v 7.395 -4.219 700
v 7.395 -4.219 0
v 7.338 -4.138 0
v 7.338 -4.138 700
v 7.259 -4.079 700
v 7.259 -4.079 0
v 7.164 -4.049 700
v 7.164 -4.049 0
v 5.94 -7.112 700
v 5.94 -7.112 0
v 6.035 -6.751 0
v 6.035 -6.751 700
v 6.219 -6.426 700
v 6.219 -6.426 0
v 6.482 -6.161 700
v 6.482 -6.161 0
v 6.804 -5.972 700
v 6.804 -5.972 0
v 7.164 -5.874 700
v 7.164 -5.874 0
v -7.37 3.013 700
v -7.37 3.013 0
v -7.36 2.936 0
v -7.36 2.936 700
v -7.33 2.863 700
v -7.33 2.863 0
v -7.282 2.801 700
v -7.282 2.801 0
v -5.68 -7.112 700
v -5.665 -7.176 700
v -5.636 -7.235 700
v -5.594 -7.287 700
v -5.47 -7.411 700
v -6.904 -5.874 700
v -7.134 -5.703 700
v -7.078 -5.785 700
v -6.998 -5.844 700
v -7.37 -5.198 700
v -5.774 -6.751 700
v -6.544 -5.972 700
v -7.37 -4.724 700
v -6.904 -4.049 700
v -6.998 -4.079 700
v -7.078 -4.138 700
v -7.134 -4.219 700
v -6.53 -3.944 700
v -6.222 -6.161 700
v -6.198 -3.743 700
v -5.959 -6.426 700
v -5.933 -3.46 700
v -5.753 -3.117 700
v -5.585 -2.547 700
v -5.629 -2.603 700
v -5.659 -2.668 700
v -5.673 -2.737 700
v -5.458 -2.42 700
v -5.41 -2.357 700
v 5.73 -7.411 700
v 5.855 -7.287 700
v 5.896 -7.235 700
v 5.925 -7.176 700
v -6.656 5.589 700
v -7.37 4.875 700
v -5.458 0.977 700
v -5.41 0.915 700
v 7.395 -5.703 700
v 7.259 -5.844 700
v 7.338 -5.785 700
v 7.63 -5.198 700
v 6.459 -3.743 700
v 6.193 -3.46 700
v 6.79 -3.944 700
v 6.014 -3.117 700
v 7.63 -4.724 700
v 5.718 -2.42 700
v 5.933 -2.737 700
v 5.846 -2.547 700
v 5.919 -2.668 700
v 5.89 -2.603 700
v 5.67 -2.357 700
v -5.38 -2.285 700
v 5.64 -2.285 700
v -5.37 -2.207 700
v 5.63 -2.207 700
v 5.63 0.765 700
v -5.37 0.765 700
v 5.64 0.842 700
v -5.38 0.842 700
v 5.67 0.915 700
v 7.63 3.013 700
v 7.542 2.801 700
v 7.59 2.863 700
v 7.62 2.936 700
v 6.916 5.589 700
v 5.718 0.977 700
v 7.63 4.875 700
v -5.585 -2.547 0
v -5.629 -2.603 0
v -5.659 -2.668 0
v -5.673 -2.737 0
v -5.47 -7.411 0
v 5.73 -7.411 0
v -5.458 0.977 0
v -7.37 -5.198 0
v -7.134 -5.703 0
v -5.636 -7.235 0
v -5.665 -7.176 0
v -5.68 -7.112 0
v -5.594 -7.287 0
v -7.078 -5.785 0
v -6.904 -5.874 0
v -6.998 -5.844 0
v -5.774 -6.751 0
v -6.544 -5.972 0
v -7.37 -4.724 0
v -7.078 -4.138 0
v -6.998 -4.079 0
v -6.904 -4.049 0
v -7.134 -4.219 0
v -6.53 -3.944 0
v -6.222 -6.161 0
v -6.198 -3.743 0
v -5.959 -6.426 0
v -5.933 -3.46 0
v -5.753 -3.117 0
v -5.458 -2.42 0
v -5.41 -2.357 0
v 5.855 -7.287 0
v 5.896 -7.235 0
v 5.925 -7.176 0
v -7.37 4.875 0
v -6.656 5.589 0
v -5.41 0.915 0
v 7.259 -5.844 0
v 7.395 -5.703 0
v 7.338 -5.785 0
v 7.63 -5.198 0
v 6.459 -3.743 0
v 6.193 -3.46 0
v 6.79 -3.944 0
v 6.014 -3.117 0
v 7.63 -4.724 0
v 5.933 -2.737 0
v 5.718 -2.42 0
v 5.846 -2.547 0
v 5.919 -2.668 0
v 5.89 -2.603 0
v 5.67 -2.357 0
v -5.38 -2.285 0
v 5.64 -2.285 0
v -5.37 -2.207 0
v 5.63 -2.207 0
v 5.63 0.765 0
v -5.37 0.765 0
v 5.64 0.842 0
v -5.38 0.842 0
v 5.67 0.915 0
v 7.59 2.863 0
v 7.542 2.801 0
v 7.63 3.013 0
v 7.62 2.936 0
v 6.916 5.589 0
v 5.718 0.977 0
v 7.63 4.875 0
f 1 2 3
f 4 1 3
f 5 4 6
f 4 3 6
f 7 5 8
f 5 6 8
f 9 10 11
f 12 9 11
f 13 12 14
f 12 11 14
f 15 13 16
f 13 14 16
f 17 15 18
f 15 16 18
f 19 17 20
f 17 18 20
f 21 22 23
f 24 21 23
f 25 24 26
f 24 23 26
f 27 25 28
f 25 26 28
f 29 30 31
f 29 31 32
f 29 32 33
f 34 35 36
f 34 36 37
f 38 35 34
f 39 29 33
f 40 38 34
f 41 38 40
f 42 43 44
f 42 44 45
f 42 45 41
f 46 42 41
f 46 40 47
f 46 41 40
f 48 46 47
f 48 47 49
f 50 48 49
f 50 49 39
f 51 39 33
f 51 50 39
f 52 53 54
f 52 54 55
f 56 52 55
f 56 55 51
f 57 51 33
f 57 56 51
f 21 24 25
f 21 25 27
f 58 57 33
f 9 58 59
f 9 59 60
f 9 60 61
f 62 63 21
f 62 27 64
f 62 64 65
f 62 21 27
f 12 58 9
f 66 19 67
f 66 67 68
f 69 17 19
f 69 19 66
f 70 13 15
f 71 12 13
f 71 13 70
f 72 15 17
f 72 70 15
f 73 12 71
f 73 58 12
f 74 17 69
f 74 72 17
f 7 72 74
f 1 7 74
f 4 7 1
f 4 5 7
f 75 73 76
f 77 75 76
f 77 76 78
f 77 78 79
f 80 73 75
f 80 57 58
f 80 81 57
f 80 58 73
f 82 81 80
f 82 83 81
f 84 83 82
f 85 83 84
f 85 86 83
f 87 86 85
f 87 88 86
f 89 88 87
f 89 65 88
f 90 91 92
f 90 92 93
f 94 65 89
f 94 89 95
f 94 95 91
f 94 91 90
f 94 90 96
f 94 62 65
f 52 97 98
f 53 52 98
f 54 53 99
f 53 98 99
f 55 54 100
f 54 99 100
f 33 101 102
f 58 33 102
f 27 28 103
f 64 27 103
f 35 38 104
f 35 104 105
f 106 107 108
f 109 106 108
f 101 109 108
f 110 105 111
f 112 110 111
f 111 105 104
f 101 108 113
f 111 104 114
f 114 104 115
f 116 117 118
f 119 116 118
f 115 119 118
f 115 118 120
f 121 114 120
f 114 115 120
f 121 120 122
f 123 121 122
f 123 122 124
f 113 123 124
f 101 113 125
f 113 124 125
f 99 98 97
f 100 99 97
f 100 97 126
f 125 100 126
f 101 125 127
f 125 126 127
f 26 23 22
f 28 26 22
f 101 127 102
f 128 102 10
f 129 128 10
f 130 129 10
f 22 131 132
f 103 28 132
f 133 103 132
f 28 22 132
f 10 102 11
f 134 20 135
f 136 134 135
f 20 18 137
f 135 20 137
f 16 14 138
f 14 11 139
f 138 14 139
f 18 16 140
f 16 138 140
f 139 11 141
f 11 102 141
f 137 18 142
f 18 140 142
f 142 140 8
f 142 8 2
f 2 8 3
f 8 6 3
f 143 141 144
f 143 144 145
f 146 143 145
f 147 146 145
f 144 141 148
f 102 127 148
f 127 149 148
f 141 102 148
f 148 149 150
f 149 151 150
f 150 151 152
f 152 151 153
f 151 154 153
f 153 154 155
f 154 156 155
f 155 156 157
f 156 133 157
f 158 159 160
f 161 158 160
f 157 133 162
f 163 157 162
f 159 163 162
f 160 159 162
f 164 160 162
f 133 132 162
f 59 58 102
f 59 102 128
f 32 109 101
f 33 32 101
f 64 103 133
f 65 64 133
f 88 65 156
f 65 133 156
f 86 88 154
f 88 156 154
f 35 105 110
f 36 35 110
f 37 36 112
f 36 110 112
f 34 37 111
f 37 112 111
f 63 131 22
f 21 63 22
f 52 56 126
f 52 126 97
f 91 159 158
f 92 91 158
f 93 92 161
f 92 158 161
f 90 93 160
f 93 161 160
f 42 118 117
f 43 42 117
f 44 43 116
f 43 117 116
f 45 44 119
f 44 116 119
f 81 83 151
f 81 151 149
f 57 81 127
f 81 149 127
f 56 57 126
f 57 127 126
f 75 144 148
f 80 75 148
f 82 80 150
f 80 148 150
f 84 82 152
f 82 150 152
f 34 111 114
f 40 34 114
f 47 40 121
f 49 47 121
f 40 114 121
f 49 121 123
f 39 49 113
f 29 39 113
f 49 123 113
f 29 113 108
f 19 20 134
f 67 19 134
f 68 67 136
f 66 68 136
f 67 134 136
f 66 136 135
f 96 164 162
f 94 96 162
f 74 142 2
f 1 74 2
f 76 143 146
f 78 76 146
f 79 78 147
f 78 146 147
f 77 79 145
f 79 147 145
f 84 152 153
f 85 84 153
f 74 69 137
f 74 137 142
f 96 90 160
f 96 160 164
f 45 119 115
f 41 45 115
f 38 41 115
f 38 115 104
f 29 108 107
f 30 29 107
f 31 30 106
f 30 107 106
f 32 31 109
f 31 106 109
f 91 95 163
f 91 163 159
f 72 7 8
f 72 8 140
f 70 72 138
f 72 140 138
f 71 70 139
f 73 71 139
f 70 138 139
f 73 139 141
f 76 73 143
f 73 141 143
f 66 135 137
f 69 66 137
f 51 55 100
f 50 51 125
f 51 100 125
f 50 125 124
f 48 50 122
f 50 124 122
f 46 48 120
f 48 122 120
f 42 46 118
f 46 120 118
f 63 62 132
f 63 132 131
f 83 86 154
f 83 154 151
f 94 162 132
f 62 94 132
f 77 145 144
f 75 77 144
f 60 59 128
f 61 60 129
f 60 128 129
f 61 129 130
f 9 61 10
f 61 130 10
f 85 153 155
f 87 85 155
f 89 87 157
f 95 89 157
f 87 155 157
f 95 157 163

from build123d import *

# Parameters (mm, degrees)
EXTRUDE_1_DEPTH = 700


with BuildPart() as part:
    # Эскиз1 → Бобышка-Вытянуть1 (new body)
    with BuildSketch(Plane.XY):
        with BuildLine():
            Line((-5.46985211, -7.411045604), (5.730145315, -7.411041789))
            Line((5.730145315, -7.411041789), (5.854638028, -7.286549685))
            ThreePointArc((5.854638028, -7.286549685), (5.911937364, -7.20635235), (5.940153705, -7.111913668))
            ThreePointArc((5.940153705, -7.111913668), (6.341942581, -6.285154294), (7.163841877, -5.873514998))
            ThreePointArc((7.163841877, -5.873514998), (7.300953358, -5.817703777), (7.394683615, -5.703121539))
            Line((7.394683615, -5.703121539), (7.630144215, -5.198183147))
            Line((7.630144215, -5.198183147), (7.630144215, -4.724329082))
            Line((7.630144215, -4.724329082), (7.394687631, -4.219406111))
            ThreePointArc((7.394687631, -4.219406111), (7.300956391, -4.104822605), (7.163843431, -4.049010766))
            ThreePointArc((7.163843431, -4.049010766), (6.316412668, -3.610860037), (5.932837044, -2.737370082))
            ThreePointArc((5.932837044, -2.737370082), (5.906391792, -2.634548817), (5.845788955, -2.547377378))
            Line((5.845788955, -2.547377378), (5.718010589, -2.419605844))
            ThreePointArc((5.718010589, -2.419605844), (5.652979011, -2.322279213), (5.630142958, -2.207474624))
            Line((5.630142958, -2.207474624), (5.630140678, 0.76469716))
            ThreePointArc((5.630140678, 0.76469716), (5.652977343, 0.879503392), (5.718010579, 0.976830996))
            Line((5.718010579, 0.976830996), (7.542273692, 2.80109288))
            ThreePointArc((7.542273692, 2.80109288), (7.607305679, 2.898420128), (7.630141876, 3.013225444))
            Line((7.630141876, 3.013225444), (7.630143411, 4.874732859))
            Line((7.630143411, 4.874732859), (6.915919245, 5.5889632))
            Line((6.915919245, 5.5889632), (-6.655632424, 5.5889632))
            Line((-6.655632424, 5.5889632), (-7.369856589, 4.874732859))
            Line((-7.369856589, 4.874732859), (-7.36985352, 3.01322547))
            ThreePointArc((-7.36985352, 3.01322547), (-7.347017561, 2.898420809), (-7.281986205, 2.801093969))
            Line((-7.281986205, 2.801093969), (-5.457722471, 0.976831278))
            ThreePointArc((-5.457722471, 0.976831278), (-5.392689614, 0.879504241), (-5.369853082, 0.764698676))
            Line((-5.369853082, 0.764698676), (-5.369850196, -2.207473107))
            ThreePointArc((-5.369850196, -2.207473107), (-5.392686546, -2.322278688), (-5.457718941, -2.419606012))
            Line((-5.457718941, -2.419606012), (-5.58549549, -2.547377941))
            ThreePointArc((-5.58549549, -2.547377941), (-5.646097371, -2.63454755), (-5.672542868, -2.737366636))
            ThreePointArc((-5.672542868, -2.737366636), (-6.056117526, -3.610859609), (-6.903549853, -4.049012485))
            ThreePointArc((-6.903549853, -4.049012485), (-7.040661794, -4.104823909), (-7.134392337, -4.219406564))
            Line((-7.134392337, -4.219406564), (-7.369851244, -4.724329406))
            Line((-7.369851244, -4.724329406), (-7.369851244, -5.198181564))
            Line((-7.369851244, -5.198181564), (-7.134391321, -5.703121225))
            ThreePointArc((-7.134391321, -5.703121225), (-7.040660935, -5.817703621), (-6.903549265, -5.873514919))
            ThreePointArc((-6.903549265, -5.873514919), (-6.081649939, -6.285154158), (-5.679860891, -7.111913449))
            ThreePointArc((-5.679860891, -7.111913449), (-5.65164477, -7.206351932), (-5.594345742, -7.286549177))
            Line((-5.594345742, -7.286549177), (-5.46985211, -7.411045604))
        make_face()
    extrude(amount=EXTRUDE_1_DEPTH)


solid = part.part
